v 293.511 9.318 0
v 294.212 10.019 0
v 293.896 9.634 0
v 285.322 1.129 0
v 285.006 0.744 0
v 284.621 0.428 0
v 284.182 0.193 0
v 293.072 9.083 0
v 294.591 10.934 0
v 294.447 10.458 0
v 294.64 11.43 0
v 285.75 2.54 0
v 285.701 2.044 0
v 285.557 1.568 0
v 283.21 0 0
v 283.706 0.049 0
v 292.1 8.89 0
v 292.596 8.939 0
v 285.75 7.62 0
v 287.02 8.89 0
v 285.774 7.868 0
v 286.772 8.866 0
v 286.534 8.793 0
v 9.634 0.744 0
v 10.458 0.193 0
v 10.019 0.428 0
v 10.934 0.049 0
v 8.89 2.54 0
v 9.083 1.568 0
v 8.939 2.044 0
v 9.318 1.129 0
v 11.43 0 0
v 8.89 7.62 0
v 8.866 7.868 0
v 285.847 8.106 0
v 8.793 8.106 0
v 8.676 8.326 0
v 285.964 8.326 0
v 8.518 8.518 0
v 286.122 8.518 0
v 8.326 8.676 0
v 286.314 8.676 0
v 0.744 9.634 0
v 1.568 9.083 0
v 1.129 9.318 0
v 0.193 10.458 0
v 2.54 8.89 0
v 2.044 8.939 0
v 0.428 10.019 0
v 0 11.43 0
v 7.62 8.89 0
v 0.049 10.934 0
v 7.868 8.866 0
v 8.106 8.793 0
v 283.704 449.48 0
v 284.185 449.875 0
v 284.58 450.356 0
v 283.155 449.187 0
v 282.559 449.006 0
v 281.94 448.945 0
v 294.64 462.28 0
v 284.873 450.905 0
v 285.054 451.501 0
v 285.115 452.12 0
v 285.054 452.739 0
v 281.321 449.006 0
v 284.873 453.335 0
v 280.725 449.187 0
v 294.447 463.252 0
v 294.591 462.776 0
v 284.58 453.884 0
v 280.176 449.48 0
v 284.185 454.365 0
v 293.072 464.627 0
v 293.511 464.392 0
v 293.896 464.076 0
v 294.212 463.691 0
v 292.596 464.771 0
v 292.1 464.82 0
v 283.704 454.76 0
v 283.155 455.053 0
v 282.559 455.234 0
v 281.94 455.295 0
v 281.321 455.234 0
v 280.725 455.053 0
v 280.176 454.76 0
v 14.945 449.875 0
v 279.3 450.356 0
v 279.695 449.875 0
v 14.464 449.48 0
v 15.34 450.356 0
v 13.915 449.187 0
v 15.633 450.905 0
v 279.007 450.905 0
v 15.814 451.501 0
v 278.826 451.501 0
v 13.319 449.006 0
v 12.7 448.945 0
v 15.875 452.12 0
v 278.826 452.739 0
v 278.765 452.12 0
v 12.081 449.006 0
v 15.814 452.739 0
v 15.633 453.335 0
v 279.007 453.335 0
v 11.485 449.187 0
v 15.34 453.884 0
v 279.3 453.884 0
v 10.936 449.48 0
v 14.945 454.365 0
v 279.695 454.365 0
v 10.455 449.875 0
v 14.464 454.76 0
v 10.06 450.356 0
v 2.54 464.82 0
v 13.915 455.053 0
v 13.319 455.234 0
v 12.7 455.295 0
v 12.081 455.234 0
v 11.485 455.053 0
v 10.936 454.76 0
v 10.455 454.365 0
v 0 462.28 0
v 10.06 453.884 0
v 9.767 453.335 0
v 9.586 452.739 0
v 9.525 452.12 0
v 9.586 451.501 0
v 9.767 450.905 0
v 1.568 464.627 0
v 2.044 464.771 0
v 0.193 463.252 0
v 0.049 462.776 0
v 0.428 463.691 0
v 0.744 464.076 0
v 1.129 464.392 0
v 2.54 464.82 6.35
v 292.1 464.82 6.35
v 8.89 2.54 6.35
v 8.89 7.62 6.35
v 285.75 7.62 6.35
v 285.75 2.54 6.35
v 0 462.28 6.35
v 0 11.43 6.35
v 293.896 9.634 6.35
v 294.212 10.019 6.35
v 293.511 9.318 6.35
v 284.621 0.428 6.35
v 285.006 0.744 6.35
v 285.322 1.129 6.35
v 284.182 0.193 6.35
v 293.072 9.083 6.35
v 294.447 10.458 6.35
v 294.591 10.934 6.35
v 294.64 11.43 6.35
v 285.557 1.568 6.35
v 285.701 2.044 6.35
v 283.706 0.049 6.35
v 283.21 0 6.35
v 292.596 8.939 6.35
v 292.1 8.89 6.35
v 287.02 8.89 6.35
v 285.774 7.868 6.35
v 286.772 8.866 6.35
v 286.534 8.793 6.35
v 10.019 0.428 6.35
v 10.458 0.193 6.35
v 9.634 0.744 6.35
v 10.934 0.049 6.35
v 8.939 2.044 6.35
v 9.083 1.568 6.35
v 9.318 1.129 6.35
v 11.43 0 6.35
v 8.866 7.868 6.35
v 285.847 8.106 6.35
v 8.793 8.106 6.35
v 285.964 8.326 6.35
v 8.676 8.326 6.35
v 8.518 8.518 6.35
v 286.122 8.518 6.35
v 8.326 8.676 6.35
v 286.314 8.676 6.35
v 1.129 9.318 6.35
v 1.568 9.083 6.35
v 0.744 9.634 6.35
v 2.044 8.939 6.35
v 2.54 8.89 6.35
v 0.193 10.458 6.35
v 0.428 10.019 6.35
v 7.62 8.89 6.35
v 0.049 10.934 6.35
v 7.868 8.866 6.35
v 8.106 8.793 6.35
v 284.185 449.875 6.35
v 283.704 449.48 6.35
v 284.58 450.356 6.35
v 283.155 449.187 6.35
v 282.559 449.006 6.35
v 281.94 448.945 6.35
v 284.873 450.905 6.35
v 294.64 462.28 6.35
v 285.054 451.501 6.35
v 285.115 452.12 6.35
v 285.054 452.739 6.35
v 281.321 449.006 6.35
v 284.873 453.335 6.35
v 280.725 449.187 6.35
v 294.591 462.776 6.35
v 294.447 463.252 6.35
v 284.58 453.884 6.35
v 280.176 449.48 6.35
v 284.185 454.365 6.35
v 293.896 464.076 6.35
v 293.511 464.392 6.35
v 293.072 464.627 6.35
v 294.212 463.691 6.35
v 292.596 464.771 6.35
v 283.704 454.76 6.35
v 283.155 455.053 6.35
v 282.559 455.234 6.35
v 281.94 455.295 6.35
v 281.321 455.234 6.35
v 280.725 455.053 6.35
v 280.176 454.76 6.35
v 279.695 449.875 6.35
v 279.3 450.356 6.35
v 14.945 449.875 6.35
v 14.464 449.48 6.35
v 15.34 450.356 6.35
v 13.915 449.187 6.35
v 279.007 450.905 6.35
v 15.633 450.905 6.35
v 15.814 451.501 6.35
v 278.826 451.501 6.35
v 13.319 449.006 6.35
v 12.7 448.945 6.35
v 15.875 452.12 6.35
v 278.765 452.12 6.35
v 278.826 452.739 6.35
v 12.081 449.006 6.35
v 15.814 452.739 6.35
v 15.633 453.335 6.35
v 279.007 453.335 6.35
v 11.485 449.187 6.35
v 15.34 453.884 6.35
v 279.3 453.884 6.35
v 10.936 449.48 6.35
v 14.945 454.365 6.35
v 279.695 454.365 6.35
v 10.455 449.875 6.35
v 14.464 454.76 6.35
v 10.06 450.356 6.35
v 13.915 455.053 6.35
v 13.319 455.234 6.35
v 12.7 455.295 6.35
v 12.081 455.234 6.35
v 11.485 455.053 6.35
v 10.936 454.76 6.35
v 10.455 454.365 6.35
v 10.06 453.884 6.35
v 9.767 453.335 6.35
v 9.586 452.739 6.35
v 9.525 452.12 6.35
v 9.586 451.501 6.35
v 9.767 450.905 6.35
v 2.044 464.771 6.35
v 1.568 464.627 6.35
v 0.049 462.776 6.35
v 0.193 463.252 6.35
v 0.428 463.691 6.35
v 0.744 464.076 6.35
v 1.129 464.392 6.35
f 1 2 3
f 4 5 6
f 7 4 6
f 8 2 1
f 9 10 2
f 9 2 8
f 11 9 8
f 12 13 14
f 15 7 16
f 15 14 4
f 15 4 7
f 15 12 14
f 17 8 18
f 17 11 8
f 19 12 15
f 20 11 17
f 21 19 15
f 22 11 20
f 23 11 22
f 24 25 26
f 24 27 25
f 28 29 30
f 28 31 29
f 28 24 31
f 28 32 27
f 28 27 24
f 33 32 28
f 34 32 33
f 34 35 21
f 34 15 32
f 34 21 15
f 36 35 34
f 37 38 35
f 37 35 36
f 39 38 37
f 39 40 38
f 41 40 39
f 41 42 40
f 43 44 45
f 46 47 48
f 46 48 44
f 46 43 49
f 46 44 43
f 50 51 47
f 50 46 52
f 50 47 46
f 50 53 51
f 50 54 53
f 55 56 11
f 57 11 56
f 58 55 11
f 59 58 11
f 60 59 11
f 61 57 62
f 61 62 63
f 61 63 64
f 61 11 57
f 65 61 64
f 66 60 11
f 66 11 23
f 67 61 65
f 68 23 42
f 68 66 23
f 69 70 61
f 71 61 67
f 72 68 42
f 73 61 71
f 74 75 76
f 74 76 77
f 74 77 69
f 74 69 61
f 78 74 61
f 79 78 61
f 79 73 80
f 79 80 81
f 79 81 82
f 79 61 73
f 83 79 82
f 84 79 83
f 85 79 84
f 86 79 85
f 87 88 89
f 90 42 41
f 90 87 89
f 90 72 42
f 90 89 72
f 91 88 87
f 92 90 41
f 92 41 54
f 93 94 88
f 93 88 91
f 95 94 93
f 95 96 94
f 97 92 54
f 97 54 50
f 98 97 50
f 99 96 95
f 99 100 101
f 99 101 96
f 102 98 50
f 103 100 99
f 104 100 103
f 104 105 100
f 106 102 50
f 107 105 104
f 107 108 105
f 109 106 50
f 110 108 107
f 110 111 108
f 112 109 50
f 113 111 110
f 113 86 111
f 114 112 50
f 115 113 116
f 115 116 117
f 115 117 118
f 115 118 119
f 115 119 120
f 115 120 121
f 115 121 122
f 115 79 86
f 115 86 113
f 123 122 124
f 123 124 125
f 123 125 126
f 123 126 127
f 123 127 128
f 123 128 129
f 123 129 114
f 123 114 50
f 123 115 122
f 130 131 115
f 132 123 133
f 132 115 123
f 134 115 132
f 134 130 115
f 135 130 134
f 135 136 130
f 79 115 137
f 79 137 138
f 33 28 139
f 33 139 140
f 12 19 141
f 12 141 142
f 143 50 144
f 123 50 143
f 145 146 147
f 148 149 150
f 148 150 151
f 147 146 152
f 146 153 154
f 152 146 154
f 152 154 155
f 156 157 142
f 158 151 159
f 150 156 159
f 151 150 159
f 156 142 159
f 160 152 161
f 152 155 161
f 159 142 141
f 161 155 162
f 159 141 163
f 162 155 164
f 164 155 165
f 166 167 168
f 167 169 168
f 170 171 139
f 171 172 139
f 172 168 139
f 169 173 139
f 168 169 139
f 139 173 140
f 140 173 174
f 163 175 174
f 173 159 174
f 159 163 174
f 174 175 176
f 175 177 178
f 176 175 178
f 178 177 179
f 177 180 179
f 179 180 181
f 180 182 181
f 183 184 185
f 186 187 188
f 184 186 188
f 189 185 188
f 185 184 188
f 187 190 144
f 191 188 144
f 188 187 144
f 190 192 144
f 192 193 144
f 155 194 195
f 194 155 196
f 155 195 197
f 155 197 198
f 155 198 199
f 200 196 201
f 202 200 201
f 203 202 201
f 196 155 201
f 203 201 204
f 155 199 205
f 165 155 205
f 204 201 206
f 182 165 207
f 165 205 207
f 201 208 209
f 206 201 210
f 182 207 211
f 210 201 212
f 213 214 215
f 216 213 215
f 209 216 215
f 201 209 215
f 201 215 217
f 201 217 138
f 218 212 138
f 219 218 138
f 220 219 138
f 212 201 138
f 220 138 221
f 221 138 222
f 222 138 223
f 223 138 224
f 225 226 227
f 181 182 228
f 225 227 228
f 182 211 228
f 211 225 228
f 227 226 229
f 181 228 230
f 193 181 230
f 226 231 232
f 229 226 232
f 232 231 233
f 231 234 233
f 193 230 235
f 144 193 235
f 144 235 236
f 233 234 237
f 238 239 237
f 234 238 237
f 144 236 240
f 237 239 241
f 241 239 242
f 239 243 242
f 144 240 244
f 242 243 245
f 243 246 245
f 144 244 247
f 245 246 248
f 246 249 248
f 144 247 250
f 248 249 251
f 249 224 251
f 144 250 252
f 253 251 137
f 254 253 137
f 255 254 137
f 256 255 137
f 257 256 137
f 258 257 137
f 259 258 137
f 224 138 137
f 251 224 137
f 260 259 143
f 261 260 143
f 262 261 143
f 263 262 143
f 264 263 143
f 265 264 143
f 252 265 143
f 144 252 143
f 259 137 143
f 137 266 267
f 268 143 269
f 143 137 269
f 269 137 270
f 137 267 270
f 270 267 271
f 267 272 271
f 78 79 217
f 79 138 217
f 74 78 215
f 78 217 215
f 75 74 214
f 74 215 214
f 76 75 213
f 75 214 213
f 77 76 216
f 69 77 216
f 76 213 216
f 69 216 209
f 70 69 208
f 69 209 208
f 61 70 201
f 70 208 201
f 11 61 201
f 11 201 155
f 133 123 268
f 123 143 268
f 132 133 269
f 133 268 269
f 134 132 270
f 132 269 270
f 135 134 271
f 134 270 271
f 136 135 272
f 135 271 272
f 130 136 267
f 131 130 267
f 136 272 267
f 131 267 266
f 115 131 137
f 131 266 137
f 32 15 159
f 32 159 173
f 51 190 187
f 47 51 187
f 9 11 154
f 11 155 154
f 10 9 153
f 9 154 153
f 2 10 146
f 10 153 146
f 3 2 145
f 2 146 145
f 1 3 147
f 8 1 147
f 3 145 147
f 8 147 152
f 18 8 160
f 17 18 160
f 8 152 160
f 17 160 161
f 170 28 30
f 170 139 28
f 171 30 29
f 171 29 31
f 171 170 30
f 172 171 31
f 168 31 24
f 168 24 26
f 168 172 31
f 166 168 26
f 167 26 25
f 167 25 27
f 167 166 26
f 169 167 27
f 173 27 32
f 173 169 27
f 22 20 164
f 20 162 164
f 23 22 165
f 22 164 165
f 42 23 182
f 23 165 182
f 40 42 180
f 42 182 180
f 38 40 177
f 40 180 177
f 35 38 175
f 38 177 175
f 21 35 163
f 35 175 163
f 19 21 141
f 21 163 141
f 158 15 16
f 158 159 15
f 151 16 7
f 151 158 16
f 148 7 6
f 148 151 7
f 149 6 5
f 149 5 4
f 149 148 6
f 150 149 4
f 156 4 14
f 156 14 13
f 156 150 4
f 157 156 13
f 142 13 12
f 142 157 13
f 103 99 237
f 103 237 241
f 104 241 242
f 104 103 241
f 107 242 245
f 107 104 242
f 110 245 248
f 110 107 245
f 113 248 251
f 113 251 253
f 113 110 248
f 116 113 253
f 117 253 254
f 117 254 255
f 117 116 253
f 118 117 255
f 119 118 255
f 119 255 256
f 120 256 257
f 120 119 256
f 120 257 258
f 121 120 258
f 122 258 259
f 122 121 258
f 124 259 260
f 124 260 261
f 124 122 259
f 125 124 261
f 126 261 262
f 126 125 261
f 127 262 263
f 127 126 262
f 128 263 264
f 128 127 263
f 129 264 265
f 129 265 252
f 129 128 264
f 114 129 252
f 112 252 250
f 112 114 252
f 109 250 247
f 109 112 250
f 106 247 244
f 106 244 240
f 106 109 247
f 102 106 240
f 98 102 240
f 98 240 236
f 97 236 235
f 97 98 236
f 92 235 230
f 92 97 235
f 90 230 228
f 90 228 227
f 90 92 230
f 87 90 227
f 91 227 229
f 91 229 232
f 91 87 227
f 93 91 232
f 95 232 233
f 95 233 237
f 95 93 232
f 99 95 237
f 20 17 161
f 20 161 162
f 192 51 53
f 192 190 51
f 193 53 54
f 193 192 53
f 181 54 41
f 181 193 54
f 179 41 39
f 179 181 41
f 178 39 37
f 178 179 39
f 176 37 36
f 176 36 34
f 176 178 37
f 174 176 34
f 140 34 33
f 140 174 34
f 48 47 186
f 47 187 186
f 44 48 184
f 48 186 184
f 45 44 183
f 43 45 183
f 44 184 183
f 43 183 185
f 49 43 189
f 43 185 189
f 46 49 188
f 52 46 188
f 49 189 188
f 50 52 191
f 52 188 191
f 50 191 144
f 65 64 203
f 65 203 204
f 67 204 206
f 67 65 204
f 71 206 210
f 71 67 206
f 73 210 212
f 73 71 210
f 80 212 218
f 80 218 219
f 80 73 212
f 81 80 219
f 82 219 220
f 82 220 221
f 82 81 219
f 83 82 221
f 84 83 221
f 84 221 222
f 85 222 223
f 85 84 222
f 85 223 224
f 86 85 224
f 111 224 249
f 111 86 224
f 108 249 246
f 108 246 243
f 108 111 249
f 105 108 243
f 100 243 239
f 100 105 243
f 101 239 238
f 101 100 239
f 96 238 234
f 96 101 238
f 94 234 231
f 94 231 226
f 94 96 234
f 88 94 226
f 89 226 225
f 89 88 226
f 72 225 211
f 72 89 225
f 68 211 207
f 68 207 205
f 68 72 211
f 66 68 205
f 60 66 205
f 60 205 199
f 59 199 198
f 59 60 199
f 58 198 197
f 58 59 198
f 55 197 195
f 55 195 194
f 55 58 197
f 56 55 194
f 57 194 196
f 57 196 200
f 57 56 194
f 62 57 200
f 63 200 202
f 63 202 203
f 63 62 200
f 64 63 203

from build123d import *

# Parameters (mm, degrees)
SKETCH1_R           = 3.175
BOSS_EXTRUDE1_DEPTH = 6.35
FILLET1_R           = 1.27
FILLET2_R           = 2.54


with BuildPart() as part:
    # Sketch1 → Boss-Extrude1 (new body)
    with BuildSketch(Plane.XY):
        Polygon((0, 464.82), (294.64, 464.82), (294.64, 8.89), (285.75, 8.89), (285.75, 0), (8.89, 0), (8.89, 8.89), (0, 8.89), align=None)
        with Locations((12.7, 452.12)):
            Circle(SKETCH1_R, mode=Mode.SUBTRACT)
        with Locations((281.94, 452.12)):
            Circle(SKETCH1_R, mode=Mode.SUBTRACT)
    extrude(amount=BOSS_EXTRUDE1_DEPTH)

    # Fillet1
    fillet1_edges = [part.edges().sort_by_distance(p)[0] for p in [
        (285.75, 8.89, 3.175),
        (8.89, 8.89, 3.175),
    ]]
    fillet(fillet1_edges, radius=FILLET1_R)

    # Fillet2
    fillet2_edges = [part.edges().sort_by_distance(p)[0] for p in [
        (0, 464.82, 3.175),
        (294.64, 464.82, 3.175),
        (294.64, 8.89, 3.175),
        (285.75, 0, 3.175),
        (8.89, 0, 3.175),
        (0, 8.89, 3.175),
    ]]
    fillet(fillet2_edges, radius=FILLET2_R)


solid = part.part
